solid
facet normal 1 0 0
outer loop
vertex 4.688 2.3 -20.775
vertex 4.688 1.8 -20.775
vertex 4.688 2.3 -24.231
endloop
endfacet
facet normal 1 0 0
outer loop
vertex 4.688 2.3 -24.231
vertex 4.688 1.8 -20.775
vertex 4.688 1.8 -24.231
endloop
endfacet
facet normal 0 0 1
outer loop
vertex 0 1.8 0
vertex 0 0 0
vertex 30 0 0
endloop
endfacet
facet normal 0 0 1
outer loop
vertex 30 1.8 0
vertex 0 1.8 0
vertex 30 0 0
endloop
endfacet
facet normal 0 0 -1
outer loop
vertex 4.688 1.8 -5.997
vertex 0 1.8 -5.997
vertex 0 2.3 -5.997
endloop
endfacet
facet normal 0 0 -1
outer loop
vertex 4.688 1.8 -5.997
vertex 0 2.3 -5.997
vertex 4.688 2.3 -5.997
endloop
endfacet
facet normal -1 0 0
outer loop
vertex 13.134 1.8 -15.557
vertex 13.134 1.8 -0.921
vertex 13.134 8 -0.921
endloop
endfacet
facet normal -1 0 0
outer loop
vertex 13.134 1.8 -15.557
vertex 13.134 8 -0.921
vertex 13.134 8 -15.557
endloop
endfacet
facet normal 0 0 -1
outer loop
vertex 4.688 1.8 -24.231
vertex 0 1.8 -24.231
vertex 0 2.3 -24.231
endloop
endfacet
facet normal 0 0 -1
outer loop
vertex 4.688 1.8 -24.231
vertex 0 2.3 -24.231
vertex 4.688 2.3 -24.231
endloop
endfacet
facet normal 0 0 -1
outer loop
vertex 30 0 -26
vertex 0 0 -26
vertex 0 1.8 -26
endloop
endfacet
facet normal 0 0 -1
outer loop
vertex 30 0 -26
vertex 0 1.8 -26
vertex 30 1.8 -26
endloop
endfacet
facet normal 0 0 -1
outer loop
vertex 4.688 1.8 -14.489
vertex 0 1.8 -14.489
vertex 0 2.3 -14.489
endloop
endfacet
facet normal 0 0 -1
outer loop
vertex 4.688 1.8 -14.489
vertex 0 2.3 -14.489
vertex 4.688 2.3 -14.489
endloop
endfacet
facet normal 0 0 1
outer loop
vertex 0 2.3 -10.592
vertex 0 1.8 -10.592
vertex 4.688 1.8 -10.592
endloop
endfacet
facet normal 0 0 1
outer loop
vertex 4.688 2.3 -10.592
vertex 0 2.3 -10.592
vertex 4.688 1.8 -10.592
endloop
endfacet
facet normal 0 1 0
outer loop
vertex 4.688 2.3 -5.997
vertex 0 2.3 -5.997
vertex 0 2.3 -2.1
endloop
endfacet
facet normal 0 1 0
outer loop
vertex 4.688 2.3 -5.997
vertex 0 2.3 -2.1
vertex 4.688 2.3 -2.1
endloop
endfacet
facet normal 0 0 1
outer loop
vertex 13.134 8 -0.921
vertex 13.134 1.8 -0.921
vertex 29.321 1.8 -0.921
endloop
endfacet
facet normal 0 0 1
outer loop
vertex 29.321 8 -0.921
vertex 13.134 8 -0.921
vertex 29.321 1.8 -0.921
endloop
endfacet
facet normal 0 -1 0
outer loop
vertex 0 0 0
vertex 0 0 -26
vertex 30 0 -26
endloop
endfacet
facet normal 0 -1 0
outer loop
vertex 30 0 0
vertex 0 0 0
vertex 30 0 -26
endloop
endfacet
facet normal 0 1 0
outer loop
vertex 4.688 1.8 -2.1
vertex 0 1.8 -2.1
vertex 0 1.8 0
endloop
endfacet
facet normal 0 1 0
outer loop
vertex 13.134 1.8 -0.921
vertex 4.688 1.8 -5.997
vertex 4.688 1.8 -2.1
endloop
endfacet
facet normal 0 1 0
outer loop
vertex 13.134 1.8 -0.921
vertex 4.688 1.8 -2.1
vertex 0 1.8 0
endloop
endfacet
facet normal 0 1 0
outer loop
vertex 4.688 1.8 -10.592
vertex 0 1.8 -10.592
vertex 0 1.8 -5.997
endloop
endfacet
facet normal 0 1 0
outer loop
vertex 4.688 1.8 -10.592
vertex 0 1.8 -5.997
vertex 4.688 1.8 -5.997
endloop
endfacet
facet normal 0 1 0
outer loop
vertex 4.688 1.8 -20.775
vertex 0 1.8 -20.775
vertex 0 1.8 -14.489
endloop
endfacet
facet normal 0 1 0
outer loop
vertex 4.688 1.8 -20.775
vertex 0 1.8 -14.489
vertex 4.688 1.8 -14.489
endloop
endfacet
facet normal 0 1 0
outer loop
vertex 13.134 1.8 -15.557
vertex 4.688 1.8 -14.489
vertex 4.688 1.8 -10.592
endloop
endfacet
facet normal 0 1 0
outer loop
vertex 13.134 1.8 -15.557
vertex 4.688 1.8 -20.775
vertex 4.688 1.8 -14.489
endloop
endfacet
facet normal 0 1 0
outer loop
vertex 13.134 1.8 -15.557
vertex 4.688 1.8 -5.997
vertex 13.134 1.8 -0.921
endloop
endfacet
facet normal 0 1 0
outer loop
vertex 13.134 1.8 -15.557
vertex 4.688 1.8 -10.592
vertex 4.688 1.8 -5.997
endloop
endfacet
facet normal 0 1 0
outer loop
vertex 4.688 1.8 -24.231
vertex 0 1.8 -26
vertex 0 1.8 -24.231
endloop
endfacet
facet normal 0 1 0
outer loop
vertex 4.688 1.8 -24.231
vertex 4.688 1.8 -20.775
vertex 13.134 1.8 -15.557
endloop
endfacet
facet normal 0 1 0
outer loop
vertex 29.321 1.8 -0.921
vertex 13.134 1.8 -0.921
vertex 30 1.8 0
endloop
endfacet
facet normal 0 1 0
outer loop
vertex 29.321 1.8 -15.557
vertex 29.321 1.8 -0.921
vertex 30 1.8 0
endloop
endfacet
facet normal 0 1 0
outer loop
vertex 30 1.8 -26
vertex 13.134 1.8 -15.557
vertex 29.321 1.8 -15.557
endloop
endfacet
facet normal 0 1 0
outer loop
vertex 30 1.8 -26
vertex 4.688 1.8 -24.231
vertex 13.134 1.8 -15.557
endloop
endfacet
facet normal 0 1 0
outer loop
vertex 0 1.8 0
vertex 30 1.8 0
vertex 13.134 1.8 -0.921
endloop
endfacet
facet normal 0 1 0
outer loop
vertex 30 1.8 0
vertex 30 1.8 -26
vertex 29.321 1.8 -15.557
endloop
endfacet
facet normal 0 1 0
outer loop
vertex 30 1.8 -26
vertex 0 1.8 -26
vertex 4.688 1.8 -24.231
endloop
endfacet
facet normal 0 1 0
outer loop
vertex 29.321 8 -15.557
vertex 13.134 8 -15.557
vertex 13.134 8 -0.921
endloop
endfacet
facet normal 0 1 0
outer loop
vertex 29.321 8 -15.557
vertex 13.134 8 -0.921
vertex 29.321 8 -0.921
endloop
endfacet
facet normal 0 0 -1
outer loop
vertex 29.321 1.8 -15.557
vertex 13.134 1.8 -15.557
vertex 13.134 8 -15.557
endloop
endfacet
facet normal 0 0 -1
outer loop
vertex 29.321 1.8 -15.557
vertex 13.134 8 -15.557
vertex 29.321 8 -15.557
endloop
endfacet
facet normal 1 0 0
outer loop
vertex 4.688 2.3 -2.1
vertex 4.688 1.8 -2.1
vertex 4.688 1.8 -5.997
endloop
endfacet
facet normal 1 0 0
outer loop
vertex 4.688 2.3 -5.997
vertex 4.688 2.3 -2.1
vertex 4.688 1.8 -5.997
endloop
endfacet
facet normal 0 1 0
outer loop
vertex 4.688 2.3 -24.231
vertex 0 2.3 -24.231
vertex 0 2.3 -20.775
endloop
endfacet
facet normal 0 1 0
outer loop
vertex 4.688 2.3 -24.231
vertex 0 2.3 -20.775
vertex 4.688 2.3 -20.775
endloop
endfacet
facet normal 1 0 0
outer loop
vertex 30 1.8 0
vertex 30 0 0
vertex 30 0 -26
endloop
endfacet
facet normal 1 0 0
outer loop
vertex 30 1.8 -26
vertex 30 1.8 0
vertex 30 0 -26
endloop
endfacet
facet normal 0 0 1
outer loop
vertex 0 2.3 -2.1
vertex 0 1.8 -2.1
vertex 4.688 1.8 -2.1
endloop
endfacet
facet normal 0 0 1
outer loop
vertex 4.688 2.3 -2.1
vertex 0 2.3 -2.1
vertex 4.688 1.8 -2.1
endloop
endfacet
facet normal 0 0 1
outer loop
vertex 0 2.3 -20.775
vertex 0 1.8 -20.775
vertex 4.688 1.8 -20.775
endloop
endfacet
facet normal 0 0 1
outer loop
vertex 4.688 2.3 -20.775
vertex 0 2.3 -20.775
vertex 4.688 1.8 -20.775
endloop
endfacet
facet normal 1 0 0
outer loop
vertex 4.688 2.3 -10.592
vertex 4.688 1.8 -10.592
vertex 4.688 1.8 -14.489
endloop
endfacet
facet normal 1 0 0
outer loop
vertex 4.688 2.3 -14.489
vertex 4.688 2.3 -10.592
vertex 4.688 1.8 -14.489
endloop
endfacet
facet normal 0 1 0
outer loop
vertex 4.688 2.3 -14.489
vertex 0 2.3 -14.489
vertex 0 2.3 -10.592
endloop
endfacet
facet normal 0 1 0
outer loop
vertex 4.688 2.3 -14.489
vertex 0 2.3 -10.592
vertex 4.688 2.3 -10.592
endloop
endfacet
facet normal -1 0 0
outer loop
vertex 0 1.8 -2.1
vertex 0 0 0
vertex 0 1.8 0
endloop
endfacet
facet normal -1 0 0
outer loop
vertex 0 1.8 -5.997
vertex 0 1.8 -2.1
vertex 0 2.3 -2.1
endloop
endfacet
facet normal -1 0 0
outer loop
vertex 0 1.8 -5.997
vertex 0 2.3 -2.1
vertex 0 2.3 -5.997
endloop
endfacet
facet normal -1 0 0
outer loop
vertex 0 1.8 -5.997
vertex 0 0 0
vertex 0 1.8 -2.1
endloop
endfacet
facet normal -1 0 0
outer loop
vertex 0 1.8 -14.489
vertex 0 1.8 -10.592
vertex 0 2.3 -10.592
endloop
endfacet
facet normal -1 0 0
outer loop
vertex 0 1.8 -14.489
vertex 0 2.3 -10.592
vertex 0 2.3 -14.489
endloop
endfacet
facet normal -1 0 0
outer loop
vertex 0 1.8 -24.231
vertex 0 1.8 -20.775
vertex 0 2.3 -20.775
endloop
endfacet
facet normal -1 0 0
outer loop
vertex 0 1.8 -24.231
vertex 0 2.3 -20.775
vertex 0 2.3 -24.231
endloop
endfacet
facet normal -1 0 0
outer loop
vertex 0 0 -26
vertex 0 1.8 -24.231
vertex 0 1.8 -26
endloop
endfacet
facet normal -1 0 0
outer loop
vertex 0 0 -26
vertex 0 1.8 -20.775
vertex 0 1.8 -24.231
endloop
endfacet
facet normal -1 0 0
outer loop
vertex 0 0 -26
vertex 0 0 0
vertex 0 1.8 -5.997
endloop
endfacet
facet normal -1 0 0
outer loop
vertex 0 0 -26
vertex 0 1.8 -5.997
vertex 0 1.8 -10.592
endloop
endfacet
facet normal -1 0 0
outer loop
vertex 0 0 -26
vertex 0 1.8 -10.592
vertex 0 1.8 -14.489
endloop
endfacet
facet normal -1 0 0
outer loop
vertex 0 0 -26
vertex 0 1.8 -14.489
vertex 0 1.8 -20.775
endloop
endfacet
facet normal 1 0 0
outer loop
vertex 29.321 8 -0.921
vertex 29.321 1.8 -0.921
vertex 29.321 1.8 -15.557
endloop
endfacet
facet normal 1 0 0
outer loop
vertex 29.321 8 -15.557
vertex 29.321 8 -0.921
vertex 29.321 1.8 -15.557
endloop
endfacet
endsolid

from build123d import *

# Parameters (mm, degrees)
SKETCH1_W           = 30
SKETCH1_H           = 26
BOSS_EXTRUDE1_DEPTH = 1.8
SKETCH1_3_W         = 16.187399031
SKETCH1_3_H         = 14.6365105
BOSS_EXTRUDE2_DEPTH = 8
SKETCH2_W           = 4.688292782
SKETCH2_H           = 3.45561668
SKETCH2_H_2         = 3.896759234
BOSS_EXTRUDE3_DEPTH = 0.5


with BuildPart() as part:
    # Sketch1 → Boss-Extrude1 (new body)
    with BuildSketch(Plane(origin=(0, 0, 0), x_dir=(1, 0, 0), z_dir=(0, 1, 0))):
        with Locations((15, 13)):
            Rectangle(SKETCH1_W, SKETCH1_H)
    extrude(amount=BOSS_EXTRUDE1_DEPTH)

    # Sketch1<3> → Boss-Extrude2 (add)
    with BuildSketch(Plane(origin=(0, 0, 0), x_dir=(1, 0, 0), z_dir=(0, 1, 0))):
        with Locations((21.227786753, 8.239095315)):
            Rectangle(SKETCH1_3_W, SKETCH1_3_H)
    extrude(amount=BOSS_EXTRUDE2_DEPTH)

    # Sketch2 → Boss-Extrude3 (add)
    with BuildSketch(Plane(origin=(0, 1.8, 0), x_dir=(1, 0, 0), z_dir=(0, 1, 0))):
        with Locations((2.344146391, 22.502945868)):
            Rectangle(SKETCH2_W, SKETCH2_H)
        with Locations((2.344146391, 12.540476505)):
            Rectangle(SKETCH2_W, SKETCH2_H_2)
        with Locations((2.344146391, 4.048482326)):
            Rectangle(SKETCH2_W, SKETCH2_H_2)
    extrude(amount=BOSS_EXTRUDE3_DEPTH)


solid = part.part
